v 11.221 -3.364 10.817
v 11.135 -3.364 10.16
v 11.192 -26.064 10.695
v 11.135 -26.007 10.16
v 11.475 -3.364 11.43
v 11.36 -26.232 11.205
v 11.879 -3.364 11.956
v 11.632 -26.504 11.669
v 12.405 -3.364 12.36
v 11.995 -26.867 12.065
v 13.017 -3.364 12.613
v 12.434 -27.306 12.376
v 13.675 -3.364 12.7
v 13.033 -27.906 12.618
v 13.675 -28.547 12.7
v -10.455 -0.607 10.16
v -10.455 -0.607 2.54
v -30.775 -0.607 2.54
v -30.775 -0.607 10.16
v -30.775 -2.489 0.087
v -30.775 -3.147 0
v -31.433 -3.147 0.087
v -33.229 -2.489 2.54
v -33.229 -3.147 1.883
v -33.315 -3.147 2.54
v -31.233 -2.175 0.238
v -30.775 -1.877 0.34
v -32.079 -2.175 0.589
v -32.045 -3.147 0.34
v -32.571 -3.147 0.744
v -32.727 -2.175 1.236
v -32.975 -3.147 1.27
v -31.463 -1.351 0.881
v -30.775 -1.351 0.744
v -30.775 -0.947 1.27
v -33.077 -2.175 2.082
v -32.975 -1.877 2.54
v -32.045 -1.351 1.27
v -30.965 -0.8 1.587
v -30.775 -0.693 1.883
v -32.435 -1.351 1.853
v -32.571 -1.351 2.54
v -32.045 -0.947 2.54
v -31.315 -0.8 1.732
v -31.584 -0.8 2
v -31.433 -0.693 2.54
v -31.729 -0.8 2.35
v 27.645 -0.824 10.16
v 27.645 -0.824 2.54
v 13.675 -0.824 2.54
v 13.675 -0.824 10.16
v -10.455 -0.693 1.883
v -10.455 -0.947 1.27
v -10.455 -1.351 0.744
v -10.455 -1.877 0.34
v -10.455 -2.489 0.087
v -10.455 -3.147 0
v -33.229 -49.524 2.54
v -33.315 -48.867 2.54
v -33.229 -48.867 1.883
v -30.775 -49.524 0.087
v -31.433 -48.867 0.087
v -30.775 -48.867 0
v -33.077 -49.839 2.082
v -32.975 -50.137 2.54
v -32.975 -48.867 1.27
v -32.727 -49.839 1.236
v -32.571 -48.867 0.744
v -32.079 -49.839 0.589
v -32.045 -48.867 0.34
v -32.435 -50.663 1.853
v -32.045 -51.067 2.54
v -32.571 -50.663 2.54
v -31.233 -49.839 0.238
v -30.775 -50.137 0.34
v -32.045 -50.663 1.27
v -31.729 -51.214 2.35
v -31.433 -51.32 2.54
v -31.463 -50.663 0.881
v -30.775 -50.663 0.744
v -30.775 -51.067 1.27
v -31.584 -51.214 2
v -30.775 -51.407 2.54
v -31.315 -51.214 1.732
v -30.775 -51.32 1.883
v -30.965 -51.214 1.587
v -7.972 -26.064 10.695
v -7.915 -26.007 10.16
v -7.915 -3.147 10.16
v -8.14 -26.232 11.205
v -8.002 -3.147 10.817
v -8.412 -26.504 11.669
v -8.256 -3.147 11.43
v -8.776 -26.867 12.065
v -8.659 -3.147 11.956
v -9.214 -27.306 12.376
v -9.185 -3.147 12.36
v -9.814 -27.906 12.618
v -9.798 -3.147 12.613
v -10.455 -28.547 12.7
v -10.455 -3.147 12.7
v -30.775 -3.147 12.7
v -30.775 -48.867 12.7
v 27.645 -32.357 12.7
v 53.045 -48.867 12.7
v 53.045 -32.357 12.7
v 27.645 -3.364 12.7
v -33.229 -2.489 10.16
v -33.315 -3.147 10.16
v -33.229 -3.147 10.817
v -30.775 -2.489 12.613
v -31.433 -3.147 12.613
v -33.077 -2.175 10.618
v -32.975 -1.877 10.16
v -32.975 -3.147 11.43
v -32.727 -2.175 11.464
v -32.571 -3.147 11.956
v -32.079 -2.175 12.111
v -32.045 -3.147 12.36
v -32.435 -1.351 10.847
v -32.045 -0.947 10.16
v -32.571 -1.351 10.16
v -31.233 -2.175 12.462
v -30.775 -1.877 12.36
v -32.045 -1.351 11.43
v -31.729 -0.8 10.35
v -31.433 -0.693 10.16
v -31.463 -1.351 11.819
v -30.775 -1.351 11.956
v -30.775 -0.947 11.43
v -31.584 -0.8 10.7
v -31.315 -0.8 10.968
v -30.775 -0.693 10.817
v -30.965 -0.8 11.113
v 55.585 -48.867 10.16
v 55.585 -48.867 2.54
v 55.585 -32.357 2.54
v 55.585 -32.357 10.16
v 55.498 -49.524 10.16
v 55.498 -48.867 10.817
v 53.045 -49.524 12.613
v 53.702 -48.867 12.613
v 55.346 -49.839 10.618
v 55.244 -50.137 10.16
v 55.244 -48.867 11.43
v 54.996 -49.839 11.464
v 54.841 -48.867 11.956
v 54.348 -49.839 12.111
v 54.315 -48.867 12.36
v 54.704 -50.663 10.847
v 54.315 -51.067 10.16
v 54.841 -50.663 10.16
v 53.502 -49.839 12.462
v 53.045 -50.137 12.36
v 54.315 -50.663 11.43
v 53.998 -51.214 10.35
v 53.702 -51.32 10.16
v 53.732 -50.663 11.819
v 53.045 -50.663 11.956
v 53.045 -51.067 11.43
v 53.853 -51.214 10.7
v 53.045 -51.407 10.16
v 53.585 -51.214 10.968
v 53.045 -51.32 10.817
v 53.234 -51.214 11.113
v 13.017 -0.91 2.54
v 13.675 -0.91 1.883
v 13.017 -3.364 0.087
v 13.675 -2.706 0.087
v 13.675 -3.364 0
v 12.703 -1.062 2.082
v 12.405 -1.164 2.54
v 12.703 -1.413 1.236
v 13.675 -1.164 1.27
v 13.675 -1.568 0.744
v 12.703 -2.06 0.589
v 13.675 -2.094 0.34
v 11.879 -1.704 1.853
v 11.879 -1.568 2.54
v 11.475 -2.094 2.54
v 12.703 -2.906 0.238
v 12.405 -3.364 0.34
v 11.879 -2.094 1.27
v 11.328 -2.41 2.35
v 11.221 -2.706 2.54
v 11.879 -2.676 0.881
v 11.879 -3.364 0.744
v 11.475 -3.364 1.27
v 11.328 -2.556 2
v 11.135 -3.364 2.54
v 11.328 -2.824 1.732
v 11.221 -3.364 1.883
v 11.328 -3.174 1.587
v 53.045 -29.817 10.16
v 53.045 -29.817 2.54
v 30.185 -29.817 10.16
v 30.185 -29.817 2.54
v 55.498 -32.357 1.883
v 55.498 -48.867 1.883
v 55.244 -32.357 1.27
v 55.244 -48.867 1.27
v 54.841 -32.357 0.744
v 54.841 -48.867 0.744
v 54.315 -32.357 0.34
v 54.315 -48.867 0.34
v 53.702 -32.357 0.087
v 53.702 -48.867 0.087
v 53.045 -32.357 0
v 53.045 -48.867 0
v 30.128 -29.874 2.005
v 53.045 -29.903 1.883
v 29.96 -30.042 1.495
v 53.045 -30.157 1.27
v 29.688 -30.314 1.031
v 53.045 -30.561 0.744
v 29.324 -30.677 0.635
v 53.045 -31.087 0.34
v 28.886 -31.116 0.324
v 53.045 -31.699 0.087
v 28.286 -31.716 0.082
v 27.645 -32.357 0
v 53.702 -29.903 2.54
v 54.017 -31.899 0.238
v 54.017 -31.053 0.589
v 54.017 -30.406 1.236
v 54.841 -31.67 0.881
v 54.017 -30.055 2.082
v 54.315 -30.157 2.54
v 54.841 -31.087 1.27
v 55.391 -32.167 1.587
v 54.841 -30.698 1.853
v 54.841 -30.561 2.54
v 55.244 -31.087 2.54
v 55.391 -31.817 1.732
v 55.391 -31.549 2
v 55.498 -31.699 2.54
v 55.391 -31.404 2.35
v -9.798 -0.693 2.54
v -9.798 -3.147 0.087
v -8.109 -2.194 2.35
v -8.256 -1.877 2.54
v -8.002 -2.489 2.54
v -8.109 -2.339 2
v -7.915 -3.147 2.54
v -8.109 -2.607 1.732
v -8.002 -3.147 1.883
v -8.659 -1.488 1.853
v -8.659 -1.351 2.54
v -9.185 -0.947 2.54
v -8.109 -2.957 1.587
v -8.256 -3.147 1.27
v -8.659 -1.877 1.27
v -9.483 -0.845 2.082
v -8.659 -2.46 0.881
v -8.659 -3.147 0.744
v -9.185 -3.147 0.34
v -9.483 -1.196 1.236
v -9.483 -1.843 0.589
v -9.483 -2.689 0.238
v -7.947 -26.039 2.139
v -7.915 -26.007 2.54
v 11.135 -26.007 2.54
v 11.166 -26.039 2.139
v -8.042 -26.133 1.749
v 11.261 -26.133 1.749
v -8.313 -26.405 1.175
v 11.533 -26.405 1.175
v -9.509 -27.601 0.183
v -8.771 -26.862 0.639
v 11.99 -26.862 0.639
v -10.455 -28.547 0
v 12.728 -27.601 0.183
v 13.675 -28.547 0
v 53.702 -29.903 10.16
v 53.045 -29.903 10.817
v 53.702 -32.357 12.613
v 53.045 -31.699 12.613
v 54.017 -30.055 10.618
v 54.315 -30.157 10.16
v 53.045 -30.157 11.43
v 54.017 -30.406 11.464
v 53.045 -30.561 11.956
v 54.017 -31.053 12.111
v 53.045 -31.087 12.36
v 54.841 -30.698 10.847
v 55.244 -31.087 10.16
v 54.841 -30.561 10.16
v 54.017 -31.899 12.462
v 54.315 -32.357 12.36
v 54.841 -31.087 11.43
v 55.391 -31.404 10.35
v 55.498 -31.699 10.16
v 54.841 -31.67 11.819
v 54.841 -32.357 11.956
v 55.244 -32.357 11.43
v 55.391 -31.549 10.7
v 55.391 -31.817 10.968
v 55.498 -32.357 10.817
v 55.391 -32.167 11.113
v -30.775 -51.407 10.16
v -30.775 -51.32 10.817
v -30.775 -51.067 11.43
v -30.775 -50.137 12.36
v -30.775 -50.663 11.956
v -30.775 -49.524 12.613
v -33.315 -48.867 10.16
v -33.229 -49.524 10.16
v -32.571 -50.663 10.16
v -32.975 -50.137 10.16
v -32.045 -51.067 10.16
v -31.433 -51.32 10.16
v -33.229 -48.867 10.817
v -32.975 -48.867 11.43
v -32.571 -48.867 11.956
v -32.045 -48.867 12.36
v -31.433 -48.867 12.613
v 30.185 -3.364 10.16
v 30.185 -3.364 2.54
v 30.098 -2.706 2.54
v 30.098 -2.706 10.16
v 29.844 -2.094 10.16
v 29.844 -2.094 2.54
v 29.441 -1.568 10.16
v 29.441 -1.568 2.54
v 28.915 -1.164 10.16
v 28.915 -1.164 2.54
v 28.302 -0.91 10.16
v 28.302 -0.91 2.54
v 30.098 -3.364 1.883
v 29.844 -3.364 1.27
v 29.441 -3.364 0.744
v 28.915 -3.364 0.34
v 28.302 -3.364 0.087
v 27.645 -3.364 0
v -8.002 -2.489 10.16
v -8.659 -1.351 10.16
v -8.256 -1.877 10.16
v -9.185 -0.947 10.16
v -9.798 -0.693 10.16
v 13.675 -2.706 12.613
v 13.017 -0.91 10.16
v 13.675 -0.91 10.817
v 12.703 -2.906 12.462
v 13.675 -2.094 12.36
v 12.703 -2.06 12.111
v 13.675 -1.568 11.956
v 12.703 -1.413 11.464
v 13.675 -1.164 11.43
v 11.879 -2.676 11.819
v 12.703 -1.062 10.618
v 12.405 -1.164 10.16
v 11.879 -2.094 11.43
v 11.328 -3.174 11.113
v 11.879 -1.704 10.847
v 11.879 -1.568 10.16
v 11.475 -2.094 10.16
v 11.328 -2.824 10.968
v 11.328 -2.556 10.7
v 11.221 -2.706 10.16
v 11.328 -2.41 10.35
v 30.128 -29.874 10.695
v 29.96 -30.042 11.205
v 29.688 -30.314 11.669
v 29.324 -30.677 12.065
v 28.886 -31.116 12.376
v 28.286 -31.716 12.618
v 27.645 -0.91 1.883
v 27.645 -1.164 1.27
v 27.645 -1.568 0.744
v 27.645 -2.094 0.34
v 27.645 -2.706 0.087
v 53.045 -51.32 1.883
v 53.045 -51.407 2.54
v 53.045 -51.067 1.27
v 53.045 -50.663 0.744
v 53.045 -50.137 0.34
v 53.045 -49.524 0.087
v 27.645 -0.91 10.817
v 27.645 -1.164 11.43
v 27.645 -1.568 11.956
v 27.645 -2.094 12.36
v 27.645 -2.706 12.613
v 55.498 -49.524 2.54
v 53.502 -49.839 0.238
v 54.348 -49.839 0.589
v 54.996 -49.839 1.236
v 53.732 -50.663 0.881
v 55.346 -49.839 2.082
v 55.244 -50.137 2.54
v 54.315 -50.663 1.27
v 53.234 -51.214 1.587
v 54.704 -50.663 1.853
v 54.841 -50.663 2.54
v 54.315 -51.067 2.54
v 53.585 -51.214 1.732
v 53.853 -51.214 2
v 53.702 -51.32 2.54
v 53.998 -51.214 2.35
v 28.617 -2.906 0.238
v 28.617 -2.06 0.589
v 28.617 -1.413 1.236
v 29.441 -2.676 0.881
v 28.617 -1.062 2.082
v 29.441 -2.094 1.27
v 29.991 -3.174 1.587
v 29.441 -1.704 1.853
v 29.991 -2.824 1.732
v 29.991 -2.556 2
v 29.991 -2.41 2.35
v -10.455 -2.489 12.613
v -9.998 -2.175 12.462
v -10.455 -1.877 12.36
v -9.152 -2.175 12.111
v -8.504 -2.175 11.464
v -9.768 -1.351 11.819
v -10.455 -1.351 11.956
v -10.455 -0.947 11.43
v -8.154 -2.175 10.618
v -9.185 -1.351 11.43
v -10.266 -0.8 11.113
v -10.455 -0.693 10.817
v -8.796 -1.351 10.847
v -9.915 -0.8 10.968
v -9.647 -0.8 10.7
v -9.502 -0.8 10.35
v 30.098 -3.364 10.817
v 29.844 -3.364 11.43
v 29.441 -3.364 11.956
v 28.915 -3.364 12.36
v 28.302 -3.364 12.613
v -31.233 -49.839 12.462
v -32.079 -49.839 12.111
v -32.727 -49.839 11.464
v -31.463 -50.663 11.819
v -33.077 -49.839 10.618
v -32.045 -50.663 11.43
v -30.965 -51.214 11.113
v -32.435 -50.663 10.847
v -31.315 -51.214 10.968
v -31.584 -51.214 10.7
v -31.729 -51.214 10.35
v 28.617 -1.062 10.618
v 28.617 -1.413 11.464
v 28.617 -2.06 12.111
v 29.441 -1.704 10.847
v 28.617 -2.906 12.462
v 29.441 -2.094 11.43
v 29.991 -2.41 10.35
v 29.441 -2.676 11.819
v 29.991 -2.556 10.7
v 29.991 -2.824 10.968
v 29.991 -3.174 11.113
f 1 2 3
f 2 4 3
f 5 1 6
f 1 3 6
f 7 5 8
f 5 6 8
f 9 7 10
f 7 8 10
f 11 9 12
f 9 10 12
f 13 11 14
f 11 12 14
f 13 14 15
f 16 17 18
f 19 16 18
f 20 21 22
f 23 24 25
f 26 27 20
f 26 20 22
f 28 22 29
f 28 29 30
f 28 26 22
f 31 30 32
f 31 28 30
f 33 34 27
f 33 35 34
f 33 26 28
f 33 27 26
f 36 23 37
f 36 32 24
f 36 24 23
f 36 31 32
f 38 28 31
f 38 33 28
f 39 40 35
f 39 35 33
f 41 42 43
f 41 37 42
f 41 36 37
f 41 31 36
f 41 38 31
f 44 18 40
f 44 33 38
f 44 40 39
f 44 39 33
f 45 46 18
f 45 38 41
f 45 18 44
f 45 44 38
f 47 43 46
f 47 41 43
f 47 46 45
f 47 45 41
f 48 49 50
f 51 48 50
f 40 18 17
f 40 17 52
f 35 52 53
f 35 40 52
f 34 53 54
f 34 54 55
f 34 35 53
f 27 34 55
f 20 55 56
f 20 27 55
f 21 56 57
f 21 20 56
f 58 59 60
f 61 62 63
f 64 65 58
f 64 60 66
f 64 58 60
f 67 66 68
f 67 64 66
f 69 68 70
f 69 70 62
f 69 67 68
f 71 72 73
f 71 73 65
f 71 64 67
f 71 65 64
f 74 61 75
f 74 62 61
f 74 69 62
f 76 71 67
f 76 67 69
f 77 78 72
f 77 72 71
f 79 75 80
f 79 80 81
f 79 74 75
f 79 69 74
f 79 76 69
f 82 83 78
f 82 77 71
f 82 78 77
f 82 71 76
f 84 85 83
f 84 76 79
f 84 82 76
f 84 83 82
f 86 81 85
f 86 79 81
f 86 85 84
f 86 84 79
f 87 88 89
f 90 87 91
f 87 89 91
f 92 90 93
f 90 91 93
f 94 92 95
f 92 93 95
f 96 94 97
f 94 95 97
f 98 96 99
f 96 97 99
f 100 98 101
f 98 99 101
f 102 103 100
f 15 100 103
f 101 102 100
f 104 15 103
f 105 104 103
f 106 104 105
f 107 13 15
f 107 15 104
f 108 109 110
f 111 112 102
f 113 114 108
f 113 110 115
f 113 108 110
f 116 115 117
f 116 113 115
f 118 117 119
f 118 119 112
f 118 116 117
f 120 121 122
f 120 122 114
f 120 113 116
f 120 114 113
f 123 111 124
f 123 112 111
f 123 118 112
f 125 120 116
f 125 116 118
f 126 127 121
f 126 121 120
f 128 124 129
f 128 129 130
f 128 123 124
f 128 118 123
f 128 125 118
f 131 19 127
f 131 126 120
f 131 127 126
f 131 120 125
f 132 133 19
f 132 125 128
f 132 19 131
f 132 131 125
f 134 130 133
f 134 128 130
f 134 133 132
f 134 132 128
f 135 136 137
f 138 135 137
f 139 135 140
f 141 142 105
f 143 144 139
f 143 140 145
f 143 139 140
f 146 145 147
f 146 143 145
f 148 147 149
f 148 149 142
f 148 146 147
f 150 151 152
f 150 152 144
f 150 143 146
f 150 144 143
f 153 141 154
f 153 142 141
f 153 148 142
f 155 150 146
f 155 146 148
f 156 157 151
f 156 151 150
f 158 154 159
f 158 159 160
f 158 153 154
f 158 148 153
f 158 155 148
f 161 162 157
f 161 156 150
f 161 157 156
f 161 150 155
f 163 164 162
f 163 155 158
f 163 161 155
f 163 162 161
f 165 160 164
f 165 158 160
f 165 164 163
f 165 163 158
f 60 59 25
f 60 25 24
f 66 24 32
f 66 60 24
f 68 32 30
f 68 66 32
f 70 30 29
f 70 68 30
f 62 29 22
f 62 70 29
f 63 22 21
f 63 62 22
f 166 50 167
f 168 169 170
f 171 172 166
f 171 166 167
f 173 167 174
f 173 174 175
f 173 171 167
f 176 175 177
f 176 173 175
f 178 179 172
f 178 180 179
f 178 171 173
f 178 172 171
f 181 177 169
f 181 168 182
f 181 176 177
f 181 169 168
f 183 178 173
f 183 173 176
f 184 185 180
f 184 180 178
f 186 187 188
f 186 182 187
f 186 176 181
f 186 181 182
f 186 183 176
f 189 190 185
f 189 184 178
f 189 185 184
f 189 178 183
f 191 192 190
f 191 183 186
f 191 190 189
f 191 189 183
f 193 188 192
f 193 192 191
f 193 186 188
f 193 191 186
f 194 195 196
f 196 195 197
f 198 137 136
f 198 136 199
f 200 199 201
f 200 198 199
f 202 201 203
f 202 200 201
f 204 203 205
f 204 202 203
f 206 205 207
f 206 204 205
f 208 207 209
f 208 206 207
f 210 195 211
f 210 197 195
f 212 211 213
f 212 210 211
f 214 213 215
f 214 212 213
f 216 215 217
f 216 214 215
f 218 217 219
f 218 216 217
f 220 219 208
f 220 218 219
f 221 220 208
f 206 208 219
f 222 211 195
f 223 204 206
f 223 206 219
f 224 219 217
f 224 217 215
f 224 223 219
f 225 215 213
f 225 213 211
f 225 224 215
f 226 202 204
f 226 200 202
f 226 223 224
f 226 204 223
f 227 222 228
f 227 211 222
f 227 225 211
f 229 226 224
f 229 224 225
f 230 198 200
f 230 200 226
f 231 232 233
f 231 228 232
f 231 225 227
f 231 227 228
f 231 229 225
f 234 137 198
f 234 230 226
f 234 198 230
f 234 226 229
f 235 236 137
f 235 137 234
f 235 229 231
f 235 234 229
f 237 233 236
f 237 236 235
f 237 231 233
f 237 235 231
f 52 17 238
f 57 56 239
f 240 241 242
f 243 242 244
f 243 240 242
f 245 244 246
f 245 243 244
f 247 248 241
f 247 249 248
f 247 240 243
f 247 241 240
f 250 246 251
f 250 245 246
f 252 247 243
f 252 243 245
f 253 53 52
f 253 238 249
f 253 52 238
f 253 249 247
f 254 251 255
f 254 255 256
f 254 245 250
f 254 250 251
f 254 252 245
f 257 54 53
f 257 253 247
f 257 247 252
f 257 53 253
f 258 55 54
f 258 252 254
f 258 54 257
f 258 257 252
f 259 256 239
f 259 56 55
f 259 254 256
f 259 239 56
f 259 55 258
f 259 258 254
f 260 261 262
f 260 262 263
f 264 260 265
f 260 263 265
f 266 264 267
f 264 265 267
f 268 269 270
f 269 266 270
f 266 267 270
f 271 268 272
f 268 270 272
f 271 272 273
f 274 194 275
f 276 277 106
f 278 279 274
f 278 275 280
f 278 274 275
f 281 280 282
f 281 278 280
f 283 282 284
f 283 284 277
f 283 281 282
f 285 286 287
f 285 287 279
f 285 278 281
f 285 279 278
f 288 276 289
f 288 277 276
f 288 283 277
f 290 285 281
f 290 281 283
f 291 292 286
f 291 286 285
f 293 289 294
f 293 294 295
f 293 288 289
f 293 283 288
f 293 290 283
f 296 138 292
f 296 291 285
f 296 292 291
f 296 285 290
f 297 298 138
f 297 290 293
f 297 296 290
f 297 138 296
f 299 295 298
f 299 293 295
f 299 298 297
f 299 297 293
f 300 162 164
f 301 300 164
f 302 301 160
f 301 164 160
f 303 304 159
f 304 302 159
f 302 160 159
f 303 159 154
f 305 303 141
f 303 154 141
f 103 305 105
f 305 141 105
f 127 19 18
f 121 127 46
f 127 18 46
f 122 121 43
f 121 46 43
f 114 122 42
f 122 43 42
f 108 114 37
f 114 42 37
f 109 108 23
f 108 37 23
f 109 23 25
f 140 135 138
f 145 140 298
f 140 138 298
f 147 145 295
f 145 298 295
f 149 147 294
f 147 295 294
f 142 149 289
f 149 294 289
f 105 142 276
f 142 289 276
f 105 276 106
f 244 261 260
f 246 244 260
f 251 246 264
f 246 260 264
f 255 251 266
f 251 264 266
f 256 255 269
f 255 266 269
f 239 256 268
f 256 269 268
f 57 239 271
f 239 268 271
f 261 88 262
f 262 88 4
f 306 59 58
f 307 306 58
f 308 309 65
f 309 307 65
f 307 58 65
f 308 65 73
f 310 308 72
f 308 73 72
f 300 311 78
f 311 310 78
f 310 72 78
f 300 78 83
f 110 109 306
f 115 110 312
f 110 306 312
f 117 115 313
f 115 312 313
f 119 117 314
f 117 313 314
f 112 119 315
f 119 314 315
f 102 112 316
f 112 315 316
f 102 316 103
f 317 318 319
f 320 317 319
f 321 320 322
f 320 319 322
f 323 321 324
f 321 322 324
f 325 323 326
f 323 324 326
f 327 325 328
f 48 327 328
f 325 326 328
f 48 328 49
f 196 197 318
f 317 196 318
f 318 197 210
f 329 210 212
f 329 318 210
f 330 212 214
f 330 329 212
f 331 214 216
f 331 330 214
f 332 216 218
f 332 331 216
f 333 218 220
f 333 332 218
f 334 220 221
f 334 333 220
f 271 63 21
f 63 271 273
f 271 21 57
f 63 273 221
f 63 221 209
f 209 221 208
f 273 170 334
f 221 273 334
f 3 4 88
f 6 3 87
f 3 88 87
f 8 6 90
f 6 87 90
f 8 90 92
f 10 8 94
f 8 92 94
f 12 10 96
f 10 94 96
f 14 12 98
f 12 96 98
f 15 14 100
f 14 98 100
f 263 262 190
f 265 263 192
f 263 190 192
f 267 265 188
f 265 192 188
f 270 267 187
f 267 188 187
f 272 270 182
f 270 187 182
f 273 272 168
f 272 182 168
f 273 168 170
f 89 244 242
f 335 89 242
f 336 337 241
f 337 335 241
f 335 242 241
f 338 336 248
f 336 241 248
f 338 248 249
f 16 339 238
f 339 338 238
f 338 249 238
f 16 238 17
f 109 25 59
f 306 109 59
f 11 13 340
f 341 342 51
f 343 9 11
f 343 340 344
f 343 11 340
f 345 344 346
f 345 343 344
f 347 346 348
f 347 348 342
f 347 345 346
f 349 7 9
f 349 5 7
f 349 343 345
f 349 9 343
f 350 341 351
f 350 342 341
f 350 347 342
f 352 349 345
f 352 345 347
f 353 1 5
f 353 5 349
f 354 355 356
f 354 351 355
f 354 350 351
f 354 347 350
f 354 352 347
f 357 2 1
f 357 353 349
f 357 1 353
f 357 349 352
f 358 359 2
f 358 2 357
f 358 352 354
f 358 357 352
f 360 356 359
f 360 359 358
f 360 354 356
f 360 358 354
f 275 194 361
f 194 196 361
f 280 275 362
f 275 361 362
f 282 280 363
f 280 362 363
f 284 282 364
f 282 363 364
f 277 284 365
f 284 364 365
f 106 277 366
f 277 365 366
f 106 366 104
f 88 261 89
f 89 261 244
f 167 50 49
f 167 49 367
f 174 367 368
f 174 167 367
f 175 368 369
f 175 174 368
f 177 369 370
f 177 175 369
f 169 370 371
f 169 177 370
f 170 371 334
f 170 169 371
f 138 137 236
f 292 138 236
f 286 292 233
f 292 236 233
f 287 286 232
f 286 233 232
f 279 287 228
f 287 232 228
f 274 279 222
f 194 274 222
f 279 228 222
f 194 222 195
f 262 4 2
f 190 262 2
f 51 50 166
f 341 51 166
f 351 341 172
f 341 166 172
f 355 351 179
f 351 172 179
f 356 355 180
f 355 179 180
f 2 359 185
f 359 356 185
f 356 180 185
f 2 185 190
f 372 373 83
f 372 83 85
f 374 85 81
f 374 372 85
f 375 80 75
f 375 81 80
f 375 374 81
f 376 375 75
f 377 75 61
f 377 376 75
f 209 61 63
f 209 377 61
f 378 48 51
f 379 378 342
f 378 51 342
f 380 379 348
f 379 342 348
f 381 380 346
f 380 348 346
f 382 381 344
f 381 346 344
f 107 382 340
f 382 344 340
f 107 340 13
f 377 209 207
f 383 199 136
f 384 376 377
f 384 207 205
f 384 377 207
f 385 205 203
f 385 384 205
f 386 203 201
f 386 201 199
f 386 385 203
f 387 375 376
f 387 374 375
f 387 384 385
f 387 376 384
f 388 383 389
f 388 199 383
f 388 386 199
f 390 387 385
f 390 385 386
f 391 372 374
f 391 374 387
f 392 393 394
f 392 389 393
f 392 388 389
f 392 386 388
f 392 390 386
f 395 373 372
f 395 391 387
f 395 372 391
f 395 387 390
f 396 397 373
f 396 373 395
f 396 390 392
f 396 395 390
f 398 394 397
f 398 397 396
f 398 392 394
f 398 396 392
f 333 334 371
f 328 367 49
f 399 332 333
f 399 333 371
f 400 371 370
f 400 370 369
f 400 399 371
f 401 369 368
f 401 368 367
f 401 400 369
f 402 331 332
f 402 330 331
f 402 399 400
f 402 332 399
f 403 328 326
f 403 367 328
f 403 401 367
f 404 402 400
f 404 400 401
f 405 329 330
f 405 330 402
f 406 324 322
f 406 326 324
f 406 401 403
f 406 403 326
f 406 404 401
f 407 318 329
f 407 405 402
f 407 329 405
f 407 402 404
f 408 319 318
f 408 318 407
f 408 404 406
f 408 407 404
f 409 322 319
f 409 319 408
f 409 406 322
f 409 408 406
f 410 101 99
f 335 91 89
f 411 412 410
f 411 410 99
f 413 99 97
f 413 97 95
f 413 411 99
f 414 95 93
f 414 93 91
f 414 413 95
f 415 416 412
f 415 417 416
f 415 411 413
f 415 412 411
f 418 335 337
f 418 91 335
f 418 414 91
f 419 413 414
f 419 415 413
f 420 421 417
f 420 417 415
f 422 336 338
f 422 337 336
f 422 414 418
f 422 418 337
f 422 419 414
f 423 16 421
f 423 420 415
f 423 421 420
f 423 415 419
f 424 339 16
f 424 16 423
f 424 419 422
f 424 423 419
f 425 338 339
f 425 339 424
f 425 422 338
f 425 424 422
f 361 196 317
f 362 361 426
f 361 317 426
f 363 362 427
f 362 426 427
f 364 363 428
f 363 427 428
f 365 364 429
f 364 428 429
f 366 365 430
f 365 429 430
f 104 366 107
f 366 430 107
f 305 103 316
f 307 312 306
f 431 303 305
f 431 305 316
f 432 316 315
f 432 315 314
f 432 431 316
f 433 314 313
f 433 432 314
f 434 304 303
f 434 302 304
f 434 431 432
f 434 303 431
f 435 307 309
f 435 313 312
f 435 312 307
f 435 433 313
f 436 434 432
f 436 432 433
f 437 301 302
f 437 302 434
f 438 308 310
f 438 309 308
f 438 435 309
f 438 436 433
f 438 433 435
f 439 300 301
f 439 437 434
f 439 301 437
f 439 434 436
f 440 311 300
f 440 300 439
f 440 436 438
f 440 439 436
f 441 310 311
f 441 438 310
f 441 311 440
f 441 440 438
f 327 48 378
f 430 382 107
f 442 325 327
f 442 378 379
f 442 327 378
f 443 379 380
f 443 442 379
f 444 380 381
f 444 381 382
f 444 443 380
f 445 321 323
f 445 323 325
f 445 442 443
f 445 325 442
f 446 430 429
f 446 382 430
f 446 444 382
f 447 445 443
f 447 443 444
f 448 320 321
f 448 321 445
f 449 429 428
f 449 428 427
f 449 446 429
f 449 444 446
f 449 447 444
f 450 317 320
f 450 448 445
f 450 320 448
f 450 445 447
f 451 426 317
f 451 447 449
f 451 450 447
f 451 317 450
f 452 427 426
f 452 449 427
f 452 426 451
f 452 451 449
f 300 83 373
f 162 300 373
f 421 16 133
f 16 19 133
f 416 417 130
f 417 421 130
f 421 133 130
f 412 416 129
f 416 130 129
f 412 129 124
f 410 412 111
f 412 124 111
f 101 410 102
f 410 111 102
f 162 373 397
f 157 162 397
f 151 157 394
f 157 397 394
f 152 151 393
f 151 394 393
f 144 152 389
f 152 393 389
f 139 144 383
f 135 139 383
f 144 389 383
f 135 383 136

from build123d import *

# Parameters (mm, degrees)
BOSS_EXTRUDE1_DEPTH = 12.7
FILLET1_R           = 2.54
FILLET2_R           = 2.54
FILLET3_R           = 2.54


with BuildPart() as part:
    # Sketch1 → Boss-Extrude1 (new body)
    with BuildSketch(Plane.XY):
        Polygon((-33.315358132, -51.406853933), (55.584641868, -51.406853933), (55.584641868, -29.816853933), (30.184641868, -29.816853933), (30.184641868, -0.823703806), (11.134641868, -0.823703806), (11.134641868, -26.006853933), (-7.915358132, -26.006853933), (-7.915358132, -0.606853933), (-33.315358132, -0.606853933), align=None)
    extrude(amount=BOSS_EXTRUDE1_DEPTH)

    # Fillet1
    fillet1_edges = [part.edges().sort_by_distance(p)[0] for p in [
        (-20.615358132, -0.606853933, 0),
        (20.659641868, -0.823703806, 0),
        (30.184641868, -15.320278869, 0),
        (42.884641868, -29.816853933, 0),
        (55.584641868, -40.611853933, 12.7),
        (55.584641868, -40.611853933, 0),
        (11.134641868, -51.406853933, 0),
        (-33.315358132, -26.006853933, 0),
        (42.884641868, -29.816853933, 12.7),
        (30.184641868, -15.320278869, 12.7),
        (20.659641868, -0.823703806, 12.7),
        (11.134641868, -13.415278869, 12.7),
        (1.609641868, -26.006853933, 12.7),
        (-7.915358132, -13.306853933, 12.7),
        (-20.615358132, -0.606853933, 12.7),
        (-33.315358132, -26.006853933, 12.7),
        (11.134641868, -51.406853933, 12.7),
    ]]
    fillet(fillet1_edges, radius=FILLET1_R)

    # Fillet2
    # the kernel refuses this fillet: 2.54 mm, written as the material it takes off along each edge
    with BuildSketch(Plane(origin=(13.674641868, -3.363703806, 10.16), x_dir=(0, 1, 0), z_dir=(-1, 0, 0))) as fillet2_piece_1_section:
        Polygon((0, 0), (FILLET2_R, 0), (FILLET2_R, -FILLET2_R), (0, -FILLET2_R), align=None)
    fillet2_piece_1 = extrude(amount=FILLET2_R, mode=Mode.PRIVATE)
    fillet2_piece_1 = fillet2_piece_1 - Plane(origin=(13.674641868, -3.363703806, 10.16), x_dir=(0, -0.7071067811865475, -0.7071067811865475), z_dir=(-1, 0, 0)) * Sphere(FILLET2_R, mode=Mode.PRIVATE)
    add(fillet2_piece_1, mode=Mode.SUBTRACT)
    with BuildSketch(Plane(origin=(-10.455358132, -3.146853933, 10.16), x_dir=(1, 0, 0), z_dir=(0, 1, 0))) as fillet2_piece_2_section:
        Polygon((0, 0), (FILLET2_R, 0), (FILLET2_R, -FILLET2_R), (0, -FILLET2_R), align=None)
    fillet2_piece_2 = extrude(amount=FILLET2_R, mode=Mode.PRIVATE)
    fillet2_piece_2 = fillet2_piece_2 - Plane(origin=(-10.455358132, -3.146853933, 10.16), x_dir=(-0.7071067811865475, 0, -0.7071067811865475), z_dir=(0, 1, 0)) * Sphere(FILLET2_R, mode=Mode.PRIVATE)
    add(fillet2_piece_2, mode=Mode.SUBTRACT)
    with BuildSketch(Plane(origin=(-7.915358132, -26.006853933, 0), x_dir=(-1, 0, 0), z_dir=(0, 1, 0))) as fillet2_piece_3:
        with BuildLine():
            CenterArc((FILLET2_R, FILLET2_R), FILLET2_R, 180, 90)
            Line((0, FILLET2_R), (0, 0))
            Line((0, 0), (FILLET2_R, 0))
        make_face()
    extrude(amount=22.86, mode=Mode.SUBTRACT)
    with BuildSketch(Plane(origin=(11.134641868, -26.006853933, 0), x_dir=(0, -1, 0), z_dir=(-1, 0, 0))) as fillet2_piece_4:
        with BuildLine():
            CenterArc((FILLET2_R, FILLET2_R), FILLET2_R, 180, 90)
            Line((0, FILLET2_R), (0, 0))
            Line((0, 0), (FILLET2_R, 0))
        make_face()
    extrude(amount=19.05, mode=Mode.SUBTRACT)
    with BuildSketch(Plane(origin=(-7.915358132, -0.606853933, 2.54), x_dir=(-1, 0, 0), z_dir=(0, 0, 1)), Plane(origin=(11.134641868, -0.823703806, 2.54), x_dir=(0, -1, 0), z_dir=(0, 0, 1))) as fillet2_piece_5:
        with BuildLine():
            CenterArc((FILLET2_R, FILLET2_R), FILLET2_R, 180, 90)
            Line((0, FILLET2_R), (0, 0))
            Line((0, 0), (FILLET2_R, 0))
        make_face()
    extrude(amount=7.62, mode=Mode.SUBTRACT)
    with BuildSketch(Plane(origin=(11.134641868, -3.363703806, 0), x_dir=(1, 0, 0), z_dir=(0, -1, 0))) as fillet2_piece_6:
        with BuildLine():
            CenterArc((FILLET2_R, FILLET2_R), FILLET2_R, 180, 90)
            Line((0, FILLET2_R), (0, 0))
            Line((0, 0), (FILLET2_R, 0))
        make_face()
    extrude(amount=22.643150126, mode=Mode.SUBTRACT)
    with BuildSketch(Plane(origin=(-7.915358132, -3.146853933, 2.54), x_dir=(0, 1, 0), z_dir=(0, 0, 1))) as fillet2_piece_7:
        with BuildLine():
            CenterArc((2.54 - FILLET2_R, FILLET2_R), FILLET2_R, 270, 90)
            Line((2.54, FILLET2_R), (2.54, 0))
            Line((2.54, 0), (2.54 - FILLET2_R, 0))
        make_face()
    revolve(axis=Axis((-7.915358132, -3.146853933, 2.54), (-1, 0, 0)), revolution_arc=90, mode=Mode.SUBTRACT)
    with BuildSketch(Plane(origin=(11.134641868, -3.363703806, 2.54), x_dir=(0, 1, 0), z_dir=(0, 0, 1))) as fillet2_piece_8:
        with BuildLine():
            CenterArc((2.54 - FILLET2_R, -FILLET2_R), FILLET2_R, 0, 90)
            Line((2.54, -FILLET2_R), (2.54, 0))
            Line((2.54, 0), (2.54 - FILLET2_R, 0))
        make_face()
    revolve(axis=Axis((11.134641868, -3.363703806, 2.54), (-1, 0, 0)), revolution_arc=90, mode=Mode.SUBTRACT)
    with BuildSketch(Plane(origin=(11.134641868, -26.006853933, 0), x_dir=(0, -1, 0), z_dir=(-1, 0, 0))) as fillet2_piece_9a_section:
        with BuildLine():
            CenterArc((FILLET2_R, FILLET2_R), FILLET2_R, 180, 90)
            Line((0, FILLET2_R), (0, 0))
            Line((0, 0), (FILLET2_R, 0))
        make_face()
    fillet2_piece_9a = extrude(amount=25.4, mode=Mode.PRIVATE)
    fillet2_piece_9a = split(fillet2_piece_9a, bisect_by=Plane(origin=(-7.915358132, -26.581897523, 0.57504359), z_dir=(-1, 0, 0)), keep=Keep.TOP, mode=Mode.PRIVATE)
    with BuildSketch(Plane(origin=(-7.915358132, -32.356853933, 0), x_dir=(-1, 0, 0), z_dir=(0, 1, 0))) as fillet2_piece_9b_section:
        with BuildLine():
            CenterArc((FILLET2_R, FILLET2_R), FILLET2_R, 180, 90)
            Line((0, FILLET2_R), (0, 0))
            Line((0, 0), (FILLET2_R, 0))
        make_face()
    fillet2_piece_9b = extrude(amount=29.21, mode=Mode.PRIVATE)
    fillet2_piece_9b = split(fillet2_piece_9b, bisect_by=Plane(origin=(-8.490401722, -26.006853933, 0.57504359), z_dir=(0, -1, 0)), keep=Keep.TOP, mode=Mode.PRIVATE)
    fillet2_piece_9 = fillet2_piece_9a & fillet2_piece_9b
    add(fillet2_piece_9, mode=Mode.SUBTRACT)
    with BuildSketch(Plane(origin=(11.134641868, -3.363703806, 0), x_dir=(1, 0, 0), z_dir=(0, -1, 0))) as fillet2_piece_10a_section:
        with BuildLine():
            CenterArc((FILLET2_R, FILLET2_R), FILLET2_R, 180, 90)
            Line((0, FILLET2_R), (0, 0))
            Line((0, 0), (FILLET2_R, 0))
        make_face()
    fillet2_piece_10a = extrude(amount=28.993150126, mode=Mode.PRIVATE)
    fillet2_piece_10a = split(fillet2_piece_10a, bisect_by=Plane(origin=(11.709685459, -26.006853933, 0.57504359), z_dir=(0, -1, 0)), keep=Keep.TOP, mode=Mode.PRIVATE)
    with BuildSketch(Plane(origin=(17.484641868, -26.006853933, 0), x_dir=(0, -1, 0), z_dir=(-1, 0, 0))) as fillet2_piece_10b_section:
        with BuildLine():
            CenterArc((FILLET2_R, FILLET2_R), FILLET2_R, 180, 90)
            Line((0, FILLET2_R), (0, 0))
            Line((0, 0), (FILLET2_R, 0))
        make_face()
    fillet2_piece_10b = extrude(amount=25.4, mode=Mode.PRIVATE)
    fillet2_piece_10b = split(fillet2_piece_10b, bisect_by=Plane(origin=(11.134641868, -26.581897523, 0.57504359), z_dir=(1, 0, 0)), keep=Keep.TOP, mode=Mode.PRIVATE)
    fillet2_piece_10 = fillet2_piece_10a & fillet2_piece_10b
    add(fillet2_piece_10, mode=Mode.SUBTRACT)

    # Fillet3
    # the kernel refuses this fillet: 2.54 mm, written as the material it takes off along each edge
    with BuildSketch(Plane(origin=(27.644641868, -3.363703806, 2.54), x_dir=(0, 1, 0), z_dir=(1, 0, 0))) as fillet3_piece_1_section:
        Polygon((0, 0), (FILLET3_R, 0), (FILLET3_R, -FILLET3_R), (0, -FILLET3_R), align=None)
    fillet3_piece_1 = extrude(amount=FILLET3_R, mode=Mode.PRIVATE)
    fillet3_piece_1 = fillet3_piece_1 - Plane(origin=(27.644641868, -3.363703806, 2.54), x_dir=(0, -0.7071067811865475, 0.7071067811865475), z_dir=(1, 0, 0)) * Sphere(FILLET3_R, mode=Mode.PRIVATE)
    add(fillet3_piece_1, mode=Mode.SUBTRACT)
    with BuildSketch(Plane(origin=(53.044641868, -32.356853933, 2.54), x_dir=(0, 1, 0), z_dir=(1, 0, 0))) as fillet3_piece_2_section:
        Polygon((0, 0), (FILLET3_R, 0), (FILLET3_R, -FILLET3_R), (0, -FILLET3_R), align=None)
    fillet3_piece_2 = extrude(amount=FILLET3_R, mode=Mode.PRIVATE)
    fillet3_piece_2 = fillet3_piece_2 - Plane(origin=(53.044641868, -32.356853933, 2.54), x_dir=(0, -0.7071067811865475, 0.7071067811865475), z_dir=(1, 0, 0)) * Sphere(FILLET3_R, mode=Mode.PRIVATE)
    add(fillet3_piece_2, mode=Mode.SUBTRACT)
    with BuildSketch(Plane(origin=(53.044641868, -48.866853933, 2.54), x_dir=(1, 0, 0), z_dir=(0, -1, 0))) as fillet3_piece_3_section:
        Polygon((0, 0), (FILLET3_R, 0), (FILLET3_R, -FILLET3_R), (0, -FILLET3_R), align=None)
    fillet3_piece_3 = extrude(amount=FILLET3_R, mode=Mode.PRIVATE)
    fillet3_piece_3 = fillet3_piece_3 - Plane(origin=(53.044641868, -48.866853933, 2.54), x_dir=(-0.7071067811865475, 0, 0.7071067811865475), z_dir=(0, -1, 0)) * Sphere(FILLET3_R, mode=Mode.PRIVATE)
    add(fillet3_piece_3, mode=Mode.SUBTRACT)
    with BuildSketch(Plane(origin=(-30.775358132, -48.866853933, 2.54), x_dir=(-1, 0, 0), z_dir=(0, -1, 0))) as fillet3_piece_4_section:
        Polygon((0, 0), (FILLET3_R, 0), (FILLET3_R, FILLET3_R), (0, FILLET3_R), align=None)
    fillet3_piece_4 = extrude(amount=FILLET3_R, mode=Mode.PRIVATE)
    fillet3_piece_4 = fillet3_piece_4 - Plane(origin=(-30.775358132, -48.866853933, 2.54), x_dir=(0.7071067811865475, 0, 0.7071067811865475), z_dir=(0, -1, 0)) * Sphere(FILLET3_R, mode=Mode.PRIVATE)
    add(fillet3_piece_4, mode=Mode.SUBTRACT)
    with BuildSketch(Plane(origin=(-30.775358132, -3.146853933, 2.54), x_dir=(-1, 0, 0), z_dir=(0, 1, 0))) as fillet3_piece_5_section:
        Polygon((0, 0), (FILLET3_R, 0), (FILLET3_R, -FILLET3_R), (0, -FILLET3_R), align=None)
    fillet3_piece_5 = extrude(amount=FILLET3_R, mode=Mode.PRIVATE)
    fillet3_piece_5 = fillet3_piece_5 - Plane(origin=(-30.775358132, -3.146853933, 2.54), x_dir=(0.7071067811865475, 0, 0.7071067811865475), z_dir=(0, 1, 0)) * Sphere(FILLET3_R, mode=Mode.PRIVATE)
    add(fillet3_piece_5, mode=Mode.SUBTRACT)
    with BuildSketch(Plane(origin=(27.644641868, -3.363703806, 10.16), x_dir=(0, 1, 0), z_dir=(1, 0, 0))) as fillet3_piece_6_section:
        Polygon((0, 0), (FILLET3_R, 0), (FILLET3_R, FILLET3_R), (0, FILLET3_R), align=None)
    fillet3_piece_6 = extrude(amount=FILLET3_R, mode=Mode.PRIVATE)
    fillet3_piece_6 = fillet3_piece_6 - Plane(origin=(27.644641868, -3.363703806, 10.16), x_dir=(0, -0.7071067811865475, -0.7071067811865475), z_dir=(1, 0, 0)) * Sphere(FILLET3_R, mode=Mode.PRIVATE)
    add(fillet3_piece_6, mode=Mode.SUBTRACT)
    with BuildSketch(Plane(origin=(53.044641868, -32.356853933, 10.16), x_dir=(0, 1, 0), z_dir=(1, 0, 0))) as fillet3_piece_7_section:
        Polygon((0, 0), (FILLET3_R, 0), (FILLET3_R, FILLET3_R), (0, FILLET3_R), align=None)
    fillet3_piece_7 = extrude(amount=FILLET3_R, mode=Mode.PRIVATE)
    fillet3_piece_7 = fillet3_piece_7 - Plane(origin=(53.044641868, -32.356853933, 10.16), x_dir=(0, -0.7071067811865475, -0.7071067811865475), z_dir=(1, 0, 0)) * Sphere(FILLET3_R, mode=Mode.PRIVATE)
    add(fillet3_piece_7, mode=Mode.SUBTRACT)
    with BuildSketch(Plane(origin=(53.044641868, -48.866853933, 10.16), x_dir=(1, 0, 0), z_dir=(0, -1, 0))) as fillet3_piece_8_section:
        Polygon((0, 0), (FILLET3_R, 0), (FILLET3_R, FILLET3_R), (0, FILLET3_R), align=None)
    fillet3_piece_8 = extrude(amount=FILLET3_R, mode=Mode.PRIVATE)
    fillet3_piece_8 = fillet3_piece_8 - Plane(origin=(53.044641868, -48.866853933, 10.16), x_dir=(-0.7071067811865475, 0, -0.7071067811865475), z_dir=(0, -1, 0)) * Sphere(FILLET3_R, mode=Mode.PRIVATE)
    add(fillet3_piece_8, mode=Mode.SUBTRACT)
    with BuildSketch(Plane(origin=(-30.775358132, -3.146853933, 10.16), x_dir=(-1, 0, 0), z_dir=(0, 1, 0))) as fillet3_piece_9_section:
        Polygon((0, 0), (FILLET3_R, 0), (FILLET3_R, FILLET3_R), (0, FILLET3_R), align=None)
    fillet3_piece_9 = extrude(amount=FILLET3_R, mode=Mode.PRIVATE)
    fillet3_piece_9 = fillet3_piece_9 - Plane(origin=(-30.775358132, -3.146853933, 10.16), x_dir=(0.7071067811865475, 0, -0.7071067811865475), z_dir=(0, 1, 0)) * Sphere(FILLET3_R, mode=Mode.PRIVATE)
    add(fillet3_piece_9, mode=Mode.SUBTRACT)
    with BuildSketch(Plane(origin=(-30.775358132, -48.866853933, 10.16), x_dir=(-1, 0, 0), z_dir=(0, -1, 0))) as fillet3_piece_10_section:
        Polygon((0, 0), (FILLET3_R, 0), (FILLET3_R, -FILLET3_R), (0, -FILLET3_R), align=None)
    fillet3_piece_10 = extrude(amount=FILLET3_R, mode=Mode.PRIVATE)
    fillet3_piece_10 = fillet3_piece_10 - Plane(origin=(-30.775358132, -48.866853933, 10.16), x_dir=(0.7071067811865475, 0, -0.7071067811865475), z_dir=(0, -1, 0)) * Sphere(FILLET3_R, mode=Mode.PRIVATE)
    add(fillet3_piece_10, mode=Mode.SUBTRACT)
    with BuildSketch(Plane(origin=(-33.315358132, -0.606853933, 2.54), x_dir=(1, 0, 0), z_dir=(0, 0, 1)), Plane(origin=(55.584641868, -51.406853933, 2.54), x_dir=(-1, 0, 0), z_dir=(0, 0, 1)), Plane(origin=(55.584641868, -29.816853933, 2.54), x_dir=(0, -1, 0), z_dir=(0, 0, 1)), Plane(origin=(30.184641868, -0.823703806, 2.54), x_dir=(0, -1, 0), z_dir=(0, 0, 1))) as fillet3_piece_11:
        with BuildLine():
            CenterArc((FILLET3_R, -FILLET3_R), FILLET3_R, 90, 90)
            Line((0, -FILLET3_R), (0, 0))
            Line((0, 0), (FILLET3_R, 0))
        make_face()
    extrude(amount=7.62, mode=Mode.SUBTRACT)
    with BuildSketch(Plane(origin=(-33.315358132, -51.406853933, 2.54), x_dir=(1, 0, 0), z_dir=(0, 0, 1))) as fillet3_piece_12:
        with BuildLine():
            CenterArc((FILLET3_R, FILLET3_R), FILLET3_R, 180, 90)
            Line((0, FILLET3_R), (0, 0))
            Line((0, 0), (FILLET3_R, 0))
        make_face()
    extrude(amount=7.62, mode=Mode.SUBTRACT)


solid = part.part
